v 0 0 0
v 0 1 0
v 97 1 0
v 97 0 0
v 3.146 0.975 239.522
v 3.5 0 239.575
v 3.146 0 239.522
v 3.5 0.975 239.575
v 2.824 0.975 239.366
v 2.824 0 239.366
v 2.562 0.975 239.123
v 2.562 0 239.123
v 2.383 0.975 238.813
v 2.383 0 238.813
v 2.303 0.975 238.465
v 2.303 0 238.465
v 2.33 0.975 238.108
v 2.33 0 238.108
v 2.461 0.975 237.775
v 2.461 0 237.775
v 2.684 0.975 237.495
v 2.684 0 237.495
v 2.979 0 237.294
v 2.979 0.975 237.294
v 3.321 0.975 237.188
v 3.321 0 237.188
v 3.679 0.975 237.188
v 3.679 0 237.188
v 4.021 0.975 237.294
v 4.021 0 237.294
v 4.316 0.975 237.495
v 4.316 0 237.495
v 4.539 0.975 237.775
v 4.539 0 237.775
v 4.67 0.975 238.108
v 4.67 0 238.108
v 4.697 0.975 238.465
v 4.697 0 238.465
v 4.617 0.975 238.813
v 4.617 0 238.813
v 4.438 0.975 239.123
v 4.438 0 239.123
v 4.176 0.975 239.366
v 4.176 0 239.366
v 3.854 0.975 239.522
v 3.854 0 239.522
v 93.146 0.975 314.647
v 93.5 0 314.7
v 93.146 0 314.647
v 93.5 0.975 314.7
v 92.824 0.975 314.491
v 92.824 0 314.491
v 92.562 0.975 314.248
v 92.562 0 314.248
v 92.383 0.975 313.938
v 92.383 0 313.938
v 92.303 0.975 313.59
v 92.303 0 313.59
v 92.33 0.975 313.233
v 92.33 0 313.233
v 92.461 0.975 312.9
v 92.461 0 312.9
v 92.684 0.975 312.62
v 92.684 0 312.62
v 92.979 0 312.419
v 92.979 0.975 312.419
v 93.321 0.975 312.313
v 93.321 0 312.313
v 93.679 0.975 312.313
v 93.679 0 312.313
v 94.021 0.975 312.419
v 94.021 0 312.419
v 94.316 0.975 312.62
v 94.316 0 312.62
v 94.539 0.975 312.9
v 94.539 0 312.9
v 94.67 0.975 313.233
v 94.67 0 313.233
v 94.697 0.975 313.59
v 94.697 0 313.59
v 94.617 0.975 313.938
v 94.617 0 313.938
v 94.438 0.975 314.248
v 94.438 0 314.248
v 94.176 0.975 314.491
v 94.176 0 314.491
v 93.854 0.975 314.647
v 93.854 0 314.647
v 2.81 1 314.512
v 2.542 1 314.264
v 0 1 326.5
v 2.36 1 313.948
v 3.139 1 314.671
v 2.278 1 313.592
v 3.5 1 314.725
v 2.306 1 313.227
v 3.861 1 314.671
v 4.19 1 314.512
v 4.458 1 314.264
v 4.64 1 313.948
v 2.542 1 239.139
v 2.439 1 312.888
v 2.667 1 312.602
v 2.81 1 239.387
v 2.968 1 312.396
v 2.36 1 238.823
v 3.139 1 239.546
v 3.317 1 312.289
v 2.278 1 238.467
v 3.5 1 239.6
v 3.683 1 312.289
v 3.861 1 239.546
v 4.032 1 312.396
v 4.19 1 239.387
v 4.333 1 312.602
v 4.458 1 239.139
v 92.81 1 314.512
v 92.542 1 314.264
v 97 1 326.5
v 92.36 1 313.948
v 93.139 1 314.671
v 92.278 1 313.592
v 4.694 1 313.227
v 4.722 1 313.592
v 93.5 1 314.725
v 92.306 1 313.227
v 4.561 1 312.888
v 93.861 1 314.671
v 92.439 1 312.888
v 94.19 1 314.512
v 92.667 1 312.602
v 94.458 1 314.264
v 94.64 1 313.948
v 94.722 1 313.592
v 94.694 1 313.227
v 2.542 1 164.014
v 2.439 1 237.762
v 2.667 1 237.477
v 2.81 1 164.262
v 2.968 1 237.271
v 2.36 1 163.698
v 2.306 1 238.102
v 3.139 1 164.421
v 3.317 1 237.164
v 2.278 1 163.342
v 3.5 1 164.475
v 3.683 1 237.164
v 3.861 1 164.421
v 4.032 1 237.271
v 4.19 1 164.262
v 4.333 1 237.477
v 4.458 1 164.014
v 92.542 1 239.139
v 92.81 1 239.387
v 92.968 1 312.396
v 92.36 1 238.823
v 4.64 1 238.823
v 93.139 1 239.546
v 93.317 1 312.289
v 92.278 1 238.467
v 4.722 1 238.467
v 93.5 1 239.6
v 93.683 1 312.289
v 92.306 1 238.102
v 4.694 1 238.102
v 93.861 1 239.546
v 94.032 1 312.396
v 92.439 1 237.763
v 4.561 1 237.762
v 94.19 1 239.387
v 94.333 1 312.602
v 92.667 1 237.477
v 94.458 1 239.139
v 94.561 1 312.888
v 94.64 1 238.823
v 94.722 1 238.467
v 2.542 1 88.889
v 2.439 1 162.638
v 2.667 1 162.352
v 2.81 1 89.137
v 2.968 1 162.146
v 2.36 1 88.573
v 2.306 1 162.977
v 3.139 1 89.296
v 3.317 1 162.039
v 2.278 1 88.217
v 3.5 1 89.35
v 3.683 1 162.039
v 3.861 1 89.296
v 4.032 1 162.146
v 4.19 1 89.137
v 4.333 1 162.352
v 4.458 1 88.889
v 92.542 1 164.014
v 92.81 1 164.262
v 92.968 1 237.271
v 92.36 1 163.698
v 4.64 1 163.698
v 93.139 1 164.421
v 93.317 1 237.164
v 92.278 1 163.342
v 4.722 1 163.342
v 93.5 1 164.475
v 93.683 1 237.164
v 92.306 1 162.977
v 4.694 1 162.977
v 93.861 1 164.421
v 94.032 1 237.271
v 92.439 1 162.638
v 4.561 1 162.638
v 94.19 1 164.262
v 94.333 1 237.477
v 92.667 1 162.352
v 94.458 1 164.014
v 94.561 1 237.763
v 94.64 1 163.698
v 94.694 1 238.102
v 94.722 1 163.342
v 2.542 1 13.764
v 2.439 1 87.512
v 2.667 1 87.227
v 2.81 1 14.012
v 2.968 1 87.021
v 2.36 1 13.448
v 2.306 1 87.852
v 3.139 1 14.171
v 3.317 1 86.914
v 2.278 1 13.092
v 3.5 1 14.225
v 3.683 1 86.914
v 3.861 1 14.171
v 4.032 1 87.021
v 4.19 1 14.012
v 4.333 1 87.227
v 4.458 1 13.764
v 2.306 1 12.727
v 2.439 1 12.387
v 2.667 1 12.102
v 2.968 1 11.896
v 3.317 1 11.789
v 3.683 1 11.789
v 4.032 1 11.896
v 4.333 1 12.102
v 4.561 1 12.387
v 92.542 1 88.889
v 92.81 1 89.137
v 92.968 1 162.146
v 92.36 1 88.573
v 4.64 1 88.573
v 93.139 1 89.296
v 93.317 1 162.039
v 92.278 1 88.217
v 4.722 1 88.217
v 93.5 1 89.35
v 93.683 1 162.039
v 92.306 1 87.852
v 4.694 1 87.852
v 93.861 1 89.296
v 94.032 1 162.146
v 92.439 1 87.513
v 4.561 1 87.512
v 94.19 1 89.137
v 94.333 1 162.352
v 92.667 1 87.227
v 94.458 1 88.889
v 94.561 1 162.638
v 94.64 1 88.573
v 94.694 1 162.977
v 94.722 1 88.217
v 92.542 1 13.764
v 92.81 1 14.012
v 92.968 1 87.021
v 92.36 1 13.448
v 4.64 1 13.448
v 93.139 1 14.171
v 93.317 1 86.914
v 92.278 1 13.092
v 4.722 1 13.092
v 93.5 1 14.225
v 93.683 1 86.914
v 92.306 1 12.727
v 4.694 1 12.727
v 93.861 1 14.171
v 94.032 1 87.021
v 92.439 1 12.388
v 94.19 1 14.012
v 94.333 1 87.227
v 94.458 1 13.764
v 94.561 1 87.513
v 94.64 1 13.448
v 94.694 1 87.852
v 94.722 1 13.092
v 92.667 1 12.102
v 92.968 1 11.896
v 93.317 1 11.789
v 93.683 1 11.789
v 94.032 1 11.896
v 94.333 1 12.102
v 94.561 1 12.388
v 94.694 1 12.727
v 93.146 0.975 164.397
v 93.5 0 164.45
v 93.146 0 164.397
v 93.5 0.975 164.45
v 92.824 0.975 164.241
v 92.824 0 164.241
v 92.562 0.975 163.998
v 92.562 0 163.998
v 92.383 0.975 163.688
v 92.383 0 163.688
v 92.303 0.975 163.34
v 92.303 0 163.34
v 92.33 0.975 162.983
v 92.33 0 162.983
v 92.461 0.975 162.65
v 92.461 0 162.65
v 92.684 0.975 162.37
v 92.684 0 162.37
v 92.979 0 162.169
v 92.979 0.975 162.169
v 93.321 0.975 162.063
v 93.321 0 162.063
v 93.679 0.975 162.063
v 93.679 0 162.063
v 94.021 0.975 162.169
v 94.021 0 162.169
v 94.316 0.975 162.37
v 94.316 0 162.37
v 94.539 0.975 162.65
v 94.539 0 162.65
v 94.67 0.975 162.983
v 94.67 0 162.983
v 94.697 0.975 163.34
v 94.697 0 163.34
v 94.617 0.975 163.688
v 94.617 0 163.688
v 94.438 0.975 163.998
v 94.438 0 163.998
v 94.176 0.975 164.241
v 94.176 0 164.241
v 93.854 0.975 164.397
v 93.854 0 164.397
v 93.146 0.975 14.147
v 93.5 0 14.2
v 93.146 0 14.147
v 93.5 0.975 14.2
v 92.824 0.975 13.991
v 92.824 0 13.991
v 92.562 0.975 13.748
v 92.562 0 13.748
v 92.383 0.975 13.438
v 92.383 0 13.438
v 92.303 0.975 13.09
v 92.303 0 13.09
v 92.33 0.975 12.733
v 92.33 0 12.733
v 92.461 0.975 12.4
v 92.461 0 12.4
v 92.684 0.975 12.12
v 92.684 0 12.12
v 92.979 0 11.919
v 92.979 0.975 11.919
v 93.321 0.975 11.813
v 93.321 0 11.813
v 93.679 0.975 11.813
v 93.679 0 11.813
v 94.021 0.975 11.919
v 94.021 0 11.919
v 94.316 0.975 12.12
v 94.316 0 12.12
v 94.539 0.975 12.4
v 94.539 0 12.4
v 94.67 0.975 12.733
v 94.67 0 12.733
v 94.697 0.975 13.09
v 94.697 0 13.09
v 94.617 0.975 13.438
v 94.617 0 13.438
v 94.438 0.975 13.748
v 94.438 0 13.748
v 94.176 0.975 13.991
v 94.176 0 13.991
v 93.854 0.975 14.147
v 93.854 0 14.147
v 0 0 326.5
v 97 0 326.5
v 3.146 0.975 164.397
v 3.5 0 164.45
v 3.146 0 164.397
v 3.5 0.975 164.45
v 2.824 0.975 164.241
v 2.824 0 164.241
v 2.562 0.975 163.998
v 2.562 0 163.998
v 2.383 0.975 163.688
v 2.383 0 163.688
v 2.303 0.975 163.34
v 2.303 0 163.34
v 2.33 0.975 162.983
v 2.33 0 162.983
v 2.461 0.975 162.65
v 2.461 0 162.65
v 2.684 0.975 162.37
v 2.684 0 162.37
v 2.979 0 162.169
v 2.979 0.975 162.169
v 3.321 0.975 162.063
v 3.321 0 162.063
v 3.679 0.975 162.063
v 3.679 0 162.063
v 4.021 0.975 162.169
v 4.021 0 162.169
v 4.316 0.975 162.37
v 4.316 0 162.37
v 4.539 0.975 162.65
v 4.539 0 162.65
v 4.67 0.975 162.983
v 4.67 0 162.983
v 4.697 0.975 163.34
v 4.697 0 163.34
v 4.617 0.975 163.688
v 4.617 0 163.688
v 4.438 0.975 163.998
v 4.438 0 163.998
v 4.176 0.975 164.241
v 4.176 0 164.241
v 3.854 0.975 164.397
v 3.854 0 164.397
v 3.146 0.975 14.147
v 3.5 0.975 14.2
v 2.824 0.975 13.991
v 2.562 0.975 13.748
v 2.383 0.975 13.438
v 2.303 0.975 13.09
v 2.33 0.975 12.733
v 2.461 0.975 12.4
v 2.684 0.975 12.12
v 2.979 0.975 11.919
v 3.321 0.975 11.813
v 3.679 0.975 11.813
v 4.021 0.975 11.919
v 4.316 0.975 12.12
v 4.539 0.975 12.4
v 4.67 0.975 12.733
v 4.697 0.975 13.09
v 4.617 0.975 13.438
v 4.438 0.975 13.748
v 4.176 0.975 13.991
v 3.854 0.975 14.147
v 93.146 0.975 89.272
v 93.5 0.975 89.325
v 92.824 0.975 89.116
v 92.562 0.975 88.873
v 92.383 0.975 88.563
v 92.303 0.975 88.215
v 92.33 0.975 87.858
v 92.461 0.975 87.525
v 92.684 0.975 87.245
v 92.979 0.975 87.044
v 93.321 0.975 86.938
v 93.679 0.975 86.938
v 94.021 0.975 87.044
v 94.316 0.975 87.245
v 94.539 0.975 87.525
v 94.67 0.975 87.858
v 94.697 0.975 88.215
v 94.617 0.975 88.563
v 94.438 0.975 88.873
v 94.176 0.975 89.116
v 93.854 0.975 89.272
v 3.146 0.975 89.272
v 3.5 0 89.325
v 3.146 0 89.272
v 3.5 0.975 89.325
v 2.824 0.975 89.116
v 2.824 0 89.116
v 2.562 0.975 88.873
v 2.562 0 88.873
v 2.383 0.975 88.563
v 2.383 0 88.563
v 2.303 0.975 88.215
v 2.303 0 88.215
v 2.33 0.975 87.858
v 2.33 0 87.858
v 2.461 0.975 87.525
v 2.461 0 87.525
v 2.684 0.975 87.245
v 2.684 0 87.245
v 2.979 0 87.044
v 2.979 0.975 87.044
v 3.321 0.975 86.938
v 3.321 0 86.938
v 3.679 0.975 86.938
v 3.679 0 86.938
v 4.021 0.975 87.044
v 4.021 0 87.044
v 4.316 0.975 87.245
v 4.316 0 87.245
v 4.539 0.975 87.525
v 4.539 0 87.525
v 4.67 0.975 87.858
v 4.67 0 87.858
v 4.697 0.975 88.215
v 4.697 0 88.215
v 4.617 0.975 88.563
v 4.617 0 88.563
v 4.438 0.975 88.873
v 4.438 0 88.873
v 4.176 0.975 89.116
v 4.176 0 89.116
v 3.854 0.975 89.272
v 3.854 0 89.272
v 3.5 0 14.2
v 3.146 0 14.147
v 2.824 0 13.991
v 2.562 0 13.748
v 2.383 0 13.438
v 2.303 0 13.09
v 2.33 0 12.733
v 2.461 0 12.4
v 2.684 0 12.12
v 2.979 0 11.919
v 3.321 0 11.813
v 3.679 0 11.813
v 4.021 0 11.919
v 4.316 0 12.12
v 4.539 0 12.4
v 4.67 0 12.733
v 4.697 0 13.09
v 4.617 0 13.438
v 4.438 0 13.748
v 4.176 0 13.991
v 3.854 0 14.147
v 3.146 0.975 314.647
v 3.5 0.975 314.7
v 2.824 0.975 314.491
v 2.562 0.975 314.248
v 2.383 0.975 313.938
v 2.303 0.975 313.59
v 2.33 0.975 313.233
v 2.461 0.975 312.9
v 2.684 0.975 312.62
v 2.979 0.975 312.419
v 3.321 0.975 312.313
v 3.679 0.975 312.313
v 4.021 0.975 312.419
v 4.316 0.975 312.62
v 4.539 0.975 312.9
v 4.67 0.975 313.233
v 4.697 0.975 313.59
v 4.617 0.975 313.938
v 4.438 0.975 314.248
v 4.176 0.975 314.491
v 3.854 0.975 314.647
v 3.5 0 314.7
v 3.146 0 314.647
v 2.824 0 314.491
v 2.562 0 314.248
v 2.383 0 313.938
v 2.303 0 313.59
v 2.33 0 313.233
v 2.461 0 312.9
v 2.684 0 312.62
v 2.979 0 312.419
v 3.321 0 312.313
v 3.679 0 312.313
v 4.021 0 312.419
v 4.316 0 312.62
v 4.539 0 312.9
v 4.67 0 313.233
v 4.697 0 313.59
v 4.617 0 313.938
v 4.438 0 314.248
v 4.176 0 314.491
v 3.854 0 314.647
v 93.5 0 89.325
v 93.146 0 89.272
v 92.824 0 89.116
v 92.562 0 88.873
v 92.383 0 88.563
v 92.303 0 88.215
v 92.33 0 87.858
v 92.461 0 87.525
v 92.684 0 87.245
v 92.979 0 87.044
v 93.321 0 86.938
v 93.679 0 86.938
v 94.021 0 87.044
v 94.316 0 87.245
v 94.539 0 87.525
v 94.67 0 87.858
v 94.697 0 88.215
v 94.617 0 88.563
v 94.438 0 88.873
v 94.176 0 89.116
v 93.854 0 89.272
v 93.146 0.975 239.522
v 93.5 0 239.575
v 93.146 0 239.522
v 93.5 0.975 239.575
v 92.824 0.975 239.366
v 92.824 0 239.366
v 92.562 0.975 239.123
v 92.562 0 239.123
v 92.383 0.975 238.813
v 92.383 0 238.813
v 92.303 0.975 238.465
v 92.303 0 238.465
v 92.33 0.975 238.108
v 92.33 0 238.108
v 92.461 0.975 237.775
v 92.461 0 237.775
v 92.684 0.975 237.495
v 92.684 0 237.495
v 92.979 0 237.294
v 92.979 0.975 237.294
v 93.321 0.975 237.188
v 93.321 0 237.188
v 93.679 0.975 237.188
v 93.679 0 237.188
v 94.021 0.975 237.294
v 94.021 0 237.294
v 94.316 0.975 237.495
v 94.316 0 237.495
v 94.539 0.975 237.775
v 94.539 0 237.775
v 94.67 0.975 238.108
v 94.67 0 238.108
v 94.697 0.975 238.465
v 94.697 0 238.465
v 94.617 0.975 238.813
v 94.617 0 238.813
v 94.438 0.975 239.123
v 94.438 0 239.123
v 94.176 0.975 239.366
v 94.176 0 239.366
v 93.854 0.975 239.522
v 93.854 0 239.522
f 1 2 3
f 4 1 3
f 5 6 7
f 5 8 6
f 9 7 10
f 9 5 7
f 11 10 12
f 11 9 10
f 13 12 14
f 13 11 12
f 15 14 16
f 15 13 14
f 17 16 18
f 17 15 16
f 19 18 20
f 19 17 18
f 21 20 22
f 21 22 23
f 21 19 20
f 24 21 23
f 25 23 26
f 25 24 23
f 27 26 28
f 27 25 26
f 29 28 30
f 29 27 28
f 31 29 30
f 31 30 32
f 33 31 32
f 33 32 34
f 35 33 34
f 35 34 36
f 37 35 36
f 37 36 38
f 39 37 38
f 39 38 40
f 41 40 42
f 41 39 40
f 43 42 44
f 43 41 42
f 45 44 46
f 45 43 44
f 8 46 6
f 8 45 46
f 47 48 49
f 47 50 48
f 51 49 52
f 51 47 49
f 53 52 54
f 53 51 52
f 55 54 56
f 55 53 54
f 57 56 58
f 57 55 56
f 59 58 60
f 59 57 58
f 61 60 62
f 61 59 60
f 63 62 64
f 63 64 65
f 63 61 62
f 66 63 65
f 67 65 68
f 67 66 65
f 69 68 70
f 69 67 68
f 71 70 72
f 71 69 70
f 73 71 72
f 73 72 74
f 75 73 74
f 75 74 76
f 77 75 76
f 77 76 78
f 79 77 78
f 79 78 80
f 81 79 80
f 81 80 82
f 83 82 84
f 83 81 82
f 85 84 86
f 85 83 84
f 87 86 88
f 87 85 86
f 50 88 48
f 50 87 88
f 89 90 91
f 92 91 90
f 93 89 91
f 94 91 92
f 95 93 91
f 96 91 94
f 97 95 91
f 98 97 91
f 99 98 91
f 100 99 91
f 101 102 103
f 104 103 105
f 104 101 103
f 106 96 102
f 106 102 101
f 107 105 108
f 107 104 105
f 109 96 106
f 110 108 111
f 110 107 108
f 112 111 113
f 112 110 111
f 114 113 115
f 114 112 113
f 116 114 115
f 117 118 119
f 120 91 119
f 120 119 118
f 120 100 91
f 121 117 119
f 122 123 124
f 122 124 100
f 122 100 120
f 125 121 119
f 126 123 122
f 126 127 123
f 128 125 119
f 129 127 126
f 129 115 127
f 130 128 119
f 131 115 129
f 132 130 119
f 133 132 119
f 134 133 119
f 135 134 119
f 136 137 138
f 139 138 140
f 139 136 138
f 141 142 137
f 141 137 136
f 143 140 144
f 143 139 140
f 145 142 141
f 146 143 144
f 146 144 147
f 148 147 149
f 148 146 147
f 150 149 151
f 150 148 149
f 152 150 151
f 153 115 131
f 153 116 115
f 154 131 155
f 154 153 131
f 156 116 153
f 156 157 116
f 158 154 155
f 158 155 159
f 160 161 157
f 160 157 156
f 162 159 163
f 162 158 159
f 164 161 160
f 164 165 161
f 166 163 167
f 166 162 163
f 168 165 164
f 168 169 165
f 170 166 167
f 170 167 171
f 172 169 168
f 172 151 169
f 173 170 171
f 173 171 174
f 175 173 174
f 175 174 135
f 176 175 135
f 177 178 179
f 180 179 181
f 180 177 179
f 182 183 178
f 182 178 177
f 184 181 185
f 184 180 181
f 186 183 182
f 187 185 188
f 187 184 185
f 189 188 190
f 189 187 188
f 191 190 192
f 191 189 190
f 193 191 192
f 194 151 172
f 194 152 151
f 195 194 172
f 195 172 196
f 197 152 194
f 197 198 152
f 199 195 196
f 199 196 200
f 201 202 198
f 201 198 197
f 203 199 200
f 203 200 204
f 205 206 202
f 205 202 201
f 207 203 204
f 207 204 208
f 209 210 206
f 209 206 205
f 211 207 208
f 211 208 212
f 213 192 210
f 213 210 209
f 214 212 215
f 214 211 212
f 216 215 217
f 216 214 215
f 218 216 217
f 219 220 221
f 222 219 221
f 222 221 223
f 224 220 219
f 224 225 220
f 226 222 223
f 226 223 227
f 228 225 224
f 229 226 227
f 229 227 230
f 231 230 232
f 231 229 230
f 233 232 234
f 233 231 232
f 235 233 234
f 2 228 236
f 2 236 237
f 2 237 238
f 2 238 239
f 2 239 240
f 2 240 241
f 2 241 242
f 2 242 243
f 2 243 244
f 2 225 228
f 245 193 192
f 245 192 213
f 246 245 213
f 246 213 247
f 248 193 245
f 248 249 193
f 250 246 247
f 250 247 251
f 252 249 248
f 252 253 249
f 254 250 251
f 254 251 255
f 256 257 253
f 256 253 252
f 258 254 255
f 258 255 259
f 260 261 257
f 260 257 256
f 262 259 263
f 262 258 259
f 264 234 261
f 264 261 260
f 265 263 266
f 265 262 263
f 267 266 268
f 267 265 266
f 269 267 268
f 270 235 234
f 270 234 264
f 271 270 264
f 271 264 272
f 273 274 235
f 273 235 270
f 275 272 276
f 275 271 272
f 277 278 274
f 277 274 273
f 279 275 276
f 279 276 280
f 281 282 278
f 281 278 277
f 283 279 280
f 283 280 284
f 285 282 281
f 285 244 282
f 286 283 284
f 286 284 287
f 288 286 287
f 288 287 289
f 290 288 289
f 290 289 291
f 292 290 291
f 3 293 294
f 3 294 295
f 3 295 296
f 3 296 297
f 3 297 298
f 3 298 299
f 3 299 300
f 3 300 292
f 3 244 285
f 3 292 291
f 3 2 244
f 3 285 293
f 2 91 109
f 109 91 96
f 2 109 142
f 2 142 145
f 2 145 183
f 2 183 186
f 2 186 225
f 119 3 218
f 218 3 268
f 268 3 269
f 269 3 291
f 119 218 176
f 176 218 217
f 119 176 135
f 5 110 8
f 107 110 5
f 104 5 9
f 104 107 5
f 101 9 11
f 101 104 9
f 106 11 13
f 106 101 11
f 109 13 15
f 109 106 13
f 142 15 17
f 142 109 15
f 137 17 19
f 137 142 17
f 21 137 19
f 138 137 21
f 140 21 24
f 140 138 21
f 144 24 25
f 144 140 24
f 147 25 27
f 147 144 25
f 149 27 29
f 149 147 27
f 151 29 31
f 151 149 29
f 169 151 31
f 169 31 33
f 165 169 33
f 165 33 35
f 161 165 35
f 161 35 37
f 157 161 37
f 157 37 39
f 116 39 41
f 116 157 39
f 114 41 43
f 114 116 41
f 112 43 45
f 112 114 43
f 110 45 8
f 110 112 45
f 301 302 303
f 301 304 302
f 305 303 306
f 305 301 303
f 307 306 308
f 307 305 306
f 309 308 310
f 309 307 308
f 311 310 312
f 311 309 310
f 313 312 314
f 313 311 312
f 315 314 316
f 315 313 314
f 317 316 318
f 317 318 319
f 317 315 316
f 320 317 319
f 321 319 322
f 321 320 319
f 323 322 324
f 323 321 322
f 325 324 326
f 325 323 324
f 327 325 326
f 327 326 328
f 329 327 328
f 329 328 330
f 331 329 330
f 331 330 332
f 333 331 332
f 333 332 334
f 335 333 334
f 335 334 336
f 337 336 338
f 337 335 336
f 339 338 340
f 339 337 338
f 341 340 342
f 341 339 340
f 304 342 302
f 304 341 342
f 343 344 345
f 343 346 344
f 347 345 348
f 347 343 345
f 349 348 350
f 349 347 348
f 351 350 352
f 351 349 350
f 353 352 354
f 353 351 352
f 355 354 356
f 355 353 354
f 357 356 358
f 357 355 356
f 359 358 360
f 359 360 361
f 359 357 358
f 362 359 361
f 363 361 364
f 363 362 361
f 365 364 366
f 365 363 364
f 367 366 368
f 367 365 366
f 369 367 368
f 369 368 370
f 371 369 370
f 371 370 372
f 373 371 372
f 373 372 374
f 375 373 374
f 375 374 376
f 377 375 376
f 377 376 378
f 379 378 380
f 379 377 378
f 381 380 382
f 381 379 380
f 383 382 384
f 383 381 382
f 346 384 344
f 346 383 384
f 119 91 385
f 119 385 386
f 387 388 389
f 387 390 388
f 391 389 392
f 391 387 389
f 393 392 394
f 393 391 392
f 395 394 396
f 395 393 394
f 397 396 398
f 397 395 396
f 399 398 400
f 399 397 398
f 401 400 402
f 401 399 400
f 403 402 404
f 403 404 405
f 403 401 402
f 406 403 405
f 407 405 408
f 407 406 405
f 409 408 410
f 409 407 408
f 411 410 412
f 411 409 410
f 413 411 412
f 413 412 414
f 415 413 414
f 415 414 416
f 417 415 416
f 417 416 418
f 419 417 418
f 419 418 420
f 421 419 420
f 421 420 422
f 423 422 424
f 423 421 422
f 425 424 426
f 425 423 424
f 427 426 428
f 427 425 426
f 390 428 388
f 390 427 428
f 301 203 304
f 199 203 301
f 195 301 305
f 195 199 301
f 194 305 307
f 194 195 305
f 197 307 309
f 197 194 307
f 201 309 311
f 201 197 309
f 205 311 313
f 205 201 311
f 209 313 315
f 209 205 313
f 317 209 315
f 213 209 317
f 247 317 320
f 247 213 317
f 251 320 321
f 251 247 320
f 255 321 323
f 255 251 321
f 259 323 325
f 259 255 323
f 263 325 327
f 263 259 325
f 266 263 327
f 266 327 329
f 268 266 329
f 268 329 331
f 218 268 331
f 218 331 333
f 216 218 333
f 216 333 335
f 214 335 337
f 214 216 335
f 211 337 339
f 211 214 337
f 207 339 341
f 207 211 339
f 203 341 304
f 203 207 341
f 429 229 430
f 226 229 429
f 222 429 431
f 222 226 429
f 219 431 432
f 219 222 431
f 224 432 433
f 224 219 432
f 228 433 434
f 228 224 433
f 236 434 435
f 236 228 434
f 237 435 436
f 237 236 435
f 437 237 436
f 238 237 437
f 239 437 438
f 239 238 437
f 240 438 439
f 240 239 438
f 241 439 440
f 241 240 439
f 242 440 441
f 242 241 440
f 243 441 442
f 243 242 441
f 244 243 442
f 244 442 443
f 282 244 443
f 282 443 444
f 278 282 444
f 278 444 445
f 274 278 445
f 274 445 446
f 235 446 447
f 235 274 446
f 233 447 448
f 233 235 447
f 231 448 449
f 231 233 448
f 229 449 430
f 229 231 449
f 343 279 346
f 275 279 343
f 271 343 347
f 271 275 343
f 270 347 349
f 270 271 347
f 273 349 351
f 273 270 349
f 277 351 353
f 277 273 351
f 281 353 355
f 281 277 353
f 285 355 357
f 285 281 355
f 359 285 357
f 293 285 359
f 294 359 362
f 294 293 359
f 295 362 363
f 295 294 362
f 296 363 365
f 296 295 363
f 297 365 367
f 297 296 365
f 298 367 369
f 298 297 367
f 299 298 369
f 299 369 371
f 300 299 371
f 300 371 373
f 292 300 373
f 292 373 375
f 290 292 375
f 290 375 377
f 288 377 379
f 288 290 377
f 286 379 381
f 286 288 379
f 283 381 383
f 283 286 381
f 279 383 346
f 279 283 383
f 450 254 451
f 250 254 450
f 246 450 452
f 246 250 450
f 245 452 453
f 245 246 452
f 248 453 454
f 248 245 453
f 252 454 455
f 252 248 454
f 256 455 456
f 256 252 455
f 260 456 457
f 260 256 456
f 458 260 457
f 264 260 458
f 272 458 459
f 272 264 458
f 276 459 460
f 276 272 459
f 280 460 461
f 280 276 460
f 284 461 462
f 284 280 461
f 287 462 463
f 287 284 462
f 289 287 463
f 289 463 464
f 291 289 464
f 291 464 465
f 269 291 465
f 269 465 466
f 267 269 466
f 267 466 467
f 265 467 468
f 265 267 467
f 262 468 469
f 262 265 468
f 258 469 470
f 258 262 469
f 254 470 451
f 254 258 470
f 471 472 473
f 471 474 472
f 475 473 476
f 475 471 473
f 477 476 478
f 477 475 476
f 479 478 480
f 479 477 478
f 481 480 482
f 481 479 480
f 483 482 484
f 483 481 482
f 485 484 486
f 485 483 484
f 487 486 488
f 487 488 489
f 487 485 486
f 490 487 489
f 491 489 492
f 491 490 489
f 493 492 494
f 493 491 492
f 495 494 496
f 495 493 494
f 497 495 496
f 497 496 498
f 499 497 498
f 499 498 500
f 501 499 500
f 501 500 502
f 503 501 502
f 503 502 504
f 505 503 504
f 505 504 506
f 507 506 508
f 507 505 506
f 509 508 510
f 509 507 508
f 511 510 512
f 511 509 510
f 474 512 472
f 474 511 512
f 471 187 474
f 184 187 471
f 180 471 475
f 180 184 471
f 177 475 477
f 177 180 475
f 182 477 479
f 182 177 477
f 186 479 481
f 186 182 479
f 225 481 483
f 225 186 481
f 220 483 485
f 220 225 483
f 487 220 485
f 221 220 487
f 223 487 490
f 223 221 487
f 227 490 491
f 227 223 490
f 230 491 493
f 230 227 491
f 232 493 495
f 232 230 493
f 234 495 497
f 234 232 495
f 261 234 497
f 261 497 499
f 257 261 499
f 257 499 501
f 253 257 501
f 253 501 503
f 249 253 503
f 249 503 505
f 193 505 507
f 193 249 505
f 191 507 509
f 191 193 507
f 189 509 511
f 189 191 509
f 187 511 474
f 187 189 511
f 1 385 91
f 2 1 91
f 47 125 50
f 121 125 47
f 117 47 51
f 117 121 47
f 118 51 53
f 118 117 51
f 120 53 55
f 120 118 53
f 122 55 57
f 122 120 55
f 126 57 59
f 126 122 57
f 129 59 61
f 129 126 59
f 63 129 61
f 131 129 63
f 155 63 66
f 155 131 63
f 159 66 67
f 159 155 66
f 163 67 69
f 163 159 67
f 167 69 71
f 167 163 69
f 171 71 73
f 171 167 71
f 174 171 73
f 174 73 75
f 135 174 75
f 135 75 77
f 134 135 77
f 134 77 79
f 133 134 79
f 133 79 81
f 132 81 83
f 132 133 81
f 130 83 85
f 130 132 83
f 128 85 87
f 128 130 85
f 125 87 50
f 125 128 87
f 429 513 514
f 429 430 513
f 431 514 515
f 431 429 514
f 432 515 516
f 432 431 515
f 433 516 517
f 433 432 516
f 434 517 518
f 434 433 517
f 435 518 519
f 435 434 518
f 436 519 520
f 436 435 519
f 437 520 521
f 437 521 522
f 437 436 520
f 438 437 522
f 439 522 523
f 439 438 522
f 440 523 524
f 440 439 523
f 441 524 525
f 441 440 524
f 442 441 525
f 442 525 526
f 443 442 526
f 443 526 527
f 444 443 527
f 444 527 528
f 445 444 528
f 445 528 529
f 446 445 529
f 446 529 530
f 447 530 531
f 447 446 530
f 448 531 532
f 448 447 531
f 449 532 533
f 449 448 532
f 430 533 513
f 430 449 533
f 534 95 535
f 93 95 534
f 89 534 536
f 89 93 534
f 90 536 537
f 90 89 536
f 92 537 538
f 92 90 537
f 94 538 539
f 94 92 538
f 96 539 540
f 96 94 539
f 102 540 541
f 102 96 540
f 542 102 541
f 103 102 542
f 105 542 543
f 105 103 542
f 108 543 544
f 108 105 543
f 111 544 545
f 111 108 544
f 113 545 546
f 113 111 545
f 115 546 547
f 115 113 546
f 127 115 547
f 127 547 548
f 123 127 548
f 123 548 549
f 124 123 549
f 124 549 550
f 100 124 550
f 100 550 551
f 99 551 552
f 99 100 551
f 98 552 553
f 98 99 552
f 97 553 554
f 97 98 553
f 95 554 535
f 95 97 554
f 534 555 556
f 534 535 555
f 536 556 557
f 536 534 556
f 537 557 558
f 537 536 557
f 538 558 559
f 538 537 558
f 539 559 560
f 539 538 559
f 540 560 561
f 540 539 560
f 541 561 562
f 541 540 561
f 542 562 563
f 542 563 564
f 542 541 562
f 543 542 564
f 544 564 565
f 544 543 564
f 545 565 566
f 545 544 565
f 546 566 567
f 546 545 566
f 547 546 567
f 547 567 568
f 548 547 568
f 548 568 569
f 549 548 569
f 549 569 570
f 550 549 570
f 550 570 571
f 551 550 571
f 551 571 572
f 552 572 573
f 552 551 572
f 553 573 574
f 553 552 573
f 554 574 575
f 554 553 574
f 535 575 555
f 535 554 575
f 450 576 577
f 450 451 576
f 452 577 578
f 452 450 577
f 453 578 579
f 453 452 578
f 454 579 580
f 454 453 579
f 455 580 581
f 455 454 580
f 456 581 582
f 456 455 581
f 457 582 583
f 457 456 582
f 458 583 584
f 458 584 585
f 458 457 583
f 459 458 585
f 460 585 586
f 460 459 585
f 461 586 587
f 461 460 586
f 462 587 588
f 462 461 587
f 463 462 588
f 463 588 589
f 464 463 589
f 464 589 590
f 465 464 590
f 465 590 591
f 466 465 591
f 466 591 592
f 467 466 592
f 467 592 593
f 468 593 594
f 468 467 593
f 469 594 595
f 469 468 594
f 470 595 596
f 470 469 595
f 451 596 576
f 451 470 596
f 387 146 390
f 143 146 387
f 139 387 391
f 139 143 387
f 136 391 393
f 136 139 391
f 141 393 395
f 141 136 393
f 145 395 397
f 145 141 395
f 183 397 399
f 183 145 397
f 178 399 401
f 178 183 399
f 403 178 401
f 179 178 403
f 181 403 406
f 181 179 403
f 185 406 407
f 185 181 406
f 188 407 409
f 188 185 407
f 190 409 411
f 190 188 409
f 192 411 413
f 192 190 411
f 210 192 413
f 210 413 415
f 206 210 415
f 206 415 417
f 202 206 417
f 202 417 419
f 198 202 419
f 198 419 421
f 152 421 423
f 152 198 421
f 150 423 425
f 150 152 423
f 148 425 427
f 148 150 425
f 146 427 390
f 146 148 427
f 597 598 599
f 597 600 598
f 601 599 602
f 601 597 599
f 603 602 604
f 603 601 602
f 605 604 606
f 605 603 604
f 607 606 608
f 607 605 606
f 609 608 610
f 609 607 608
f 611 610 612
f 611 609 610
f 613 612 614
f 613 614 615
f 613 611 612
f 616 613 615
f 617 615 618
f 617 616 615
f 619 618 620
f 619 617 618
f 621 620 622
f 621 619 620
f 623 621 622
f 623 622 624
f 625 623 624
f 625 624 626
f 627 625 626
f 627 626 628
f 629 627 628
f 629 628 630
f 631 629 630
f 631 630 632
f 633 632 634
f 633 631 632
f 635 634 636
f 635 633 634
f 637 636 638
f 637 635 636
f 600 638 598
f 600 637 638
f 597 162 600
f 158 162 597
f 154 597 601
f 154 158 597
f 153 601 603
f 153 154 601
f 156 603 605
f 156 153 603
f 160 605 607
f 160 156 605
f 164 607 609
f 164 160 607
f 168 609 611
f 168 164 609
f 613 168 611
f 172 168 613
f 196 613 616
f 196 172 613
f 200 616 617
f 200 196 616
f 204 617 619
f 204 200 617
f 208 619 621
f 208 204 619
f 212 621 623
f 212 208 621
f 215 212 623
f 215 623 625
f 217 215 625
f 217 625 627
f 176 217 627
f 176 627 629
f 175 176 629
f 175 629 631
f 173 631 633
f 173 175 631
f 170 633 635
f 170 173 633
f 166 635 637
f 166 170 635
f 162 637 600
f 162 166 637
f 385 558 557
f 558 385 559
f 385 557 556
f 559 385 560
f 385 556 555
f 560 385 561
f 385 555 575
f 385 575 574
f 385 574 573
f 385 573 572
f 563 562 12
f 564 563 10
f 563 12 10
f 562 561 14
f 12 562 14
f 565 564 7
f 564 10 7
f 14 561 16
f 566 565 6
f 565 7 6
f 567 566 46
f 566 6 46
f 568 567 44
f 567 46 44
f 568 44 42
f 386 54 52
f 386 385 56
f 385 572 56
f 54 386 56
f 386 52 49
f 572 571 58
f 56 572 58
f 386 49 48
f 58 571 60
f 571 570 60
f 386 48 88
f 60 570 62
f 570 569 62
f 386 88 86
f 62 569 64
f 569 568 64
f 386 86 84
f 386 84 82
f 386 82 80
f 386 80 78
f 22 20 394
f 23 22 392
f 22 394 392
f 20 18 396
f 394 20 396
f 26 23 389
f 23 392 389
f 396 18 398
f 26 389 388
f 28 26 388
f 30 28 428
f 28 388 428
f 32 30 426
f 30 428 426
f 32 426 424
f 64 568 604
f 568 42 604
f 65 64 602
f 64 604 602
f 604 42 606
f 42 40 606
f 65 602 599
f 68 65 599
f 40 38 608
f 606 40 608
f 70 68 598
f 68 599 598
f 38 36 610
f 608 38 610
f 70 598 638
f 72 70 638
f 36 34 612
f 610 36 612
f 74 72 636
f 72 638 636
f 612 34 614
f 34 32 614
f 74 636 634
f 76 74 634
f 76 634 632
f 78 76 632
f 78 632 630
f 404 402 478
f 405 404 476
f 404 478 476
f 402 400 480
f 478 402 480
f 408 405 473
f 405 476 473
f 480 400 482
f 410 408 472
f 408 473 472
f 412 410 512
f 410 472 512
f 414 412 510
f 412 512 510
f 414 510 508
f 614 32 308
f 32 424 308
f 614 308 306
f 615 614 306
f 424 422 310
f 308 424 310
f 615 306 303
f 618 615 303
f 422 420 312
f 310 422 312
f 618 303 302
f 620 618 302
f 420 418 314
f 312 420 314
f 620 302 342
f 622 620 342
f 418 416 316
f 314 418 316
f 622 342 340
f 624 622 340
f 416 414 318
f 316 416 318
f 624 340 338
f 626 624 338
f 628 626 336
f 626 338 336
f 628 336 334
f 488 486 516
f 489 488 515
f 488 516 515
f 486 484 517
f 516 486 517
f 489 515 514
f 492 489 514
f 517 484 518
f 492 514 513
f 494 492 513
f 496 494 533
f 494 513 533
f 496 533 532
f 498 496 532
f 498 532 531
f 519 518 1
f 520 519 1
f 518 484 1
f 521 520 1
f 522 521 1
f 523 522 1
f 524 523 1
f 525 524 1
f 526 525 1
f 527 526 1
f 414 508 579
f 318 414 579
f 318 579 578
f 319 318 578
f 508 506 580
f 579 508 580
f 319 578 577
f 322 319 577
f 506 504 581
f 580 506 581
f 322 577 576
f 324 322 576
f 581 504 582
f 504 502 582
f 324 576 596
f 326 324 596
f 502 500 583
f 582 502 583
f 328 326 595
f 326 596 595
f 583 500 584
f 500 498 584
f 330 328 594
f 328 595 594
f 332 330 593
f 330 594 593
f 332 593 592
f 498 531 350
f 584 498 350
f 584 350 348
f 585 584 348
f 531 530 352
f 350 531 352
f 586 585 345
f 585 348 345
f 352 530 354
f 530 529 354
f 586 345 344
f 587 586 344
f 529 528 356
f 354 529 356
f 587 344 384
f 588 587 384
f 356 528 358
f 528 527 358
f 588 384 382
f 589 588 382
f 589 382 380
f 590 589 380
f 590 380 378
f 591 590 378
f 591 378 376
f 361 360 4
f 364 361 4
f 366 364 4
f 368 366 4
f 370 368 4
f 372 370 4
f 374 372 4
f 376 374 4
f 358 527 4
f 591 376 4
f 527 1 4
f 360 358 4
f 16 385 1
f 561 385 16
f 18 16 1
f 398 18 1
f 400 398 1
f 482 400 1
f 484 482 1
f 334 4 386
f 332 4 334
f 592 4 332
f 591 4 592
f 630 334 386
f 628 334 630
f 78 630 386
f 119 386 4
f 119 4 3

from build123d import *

# Parameters (mm, degrees)
SKETCH1_W                      = 97
SKETCH1_H                      = 1
BOSS_EXTRUDE1_DEPTH            = 326.5
M2_CLEARANCE_HOLE1_AT_2_COUNT  = 2
M2_CLEARANCE_HOLE1_AT_2_PITCH  = 90
M2_CLEARANCE_HOLE1_AT_3_COUNT  = 2
M2_CLEARANCE_HOLE1_AT_3_PITCH  = 75.125
M2_CLEARANCE_HOLE1_AT_4_COUNT  = 2
M2_CLEARANCE_HOLE1_AT_4_PITCH  = 117.233807517
M2_CLEARANCE_HOLE1_AT_5_COUNT  = 2
M2_CLEARANCE_HOLE1_AT_5_PITCH  = 150.25
M2_CLEARANCE_HOLE1_AT_6_COUNT  = 2
M2_CLEARANCE_HOLE1_AT_6_PITCH  = 175.142977307
M2_CLEARANCE_HOLE1_AT_7_COUNT  = 2
M2_CLEARANCE_HOLE1_AT_7_PITCH  = 225.375
M2_CLEARANCE_HOLE1_AT_8_COUNT  = 2
M2_CLEARANCE_HOLE1_AT_8_PITCH  = 242.680635043
M2_CLEARANCE_HOLE1_AT_9_COUNT  = 2
M2_CLEARANCE_HOLE1_AT_9_PITCH  = 300.5
M2_CLEARANCE_HOLE1_AT_10_COUNT = 2
M2_CLEARANCE_HOLE1_AT_10_PITCH = 313.688141312


with BuildPart() as part:
    # Sketch1 → Boss-Extrude1 (new body)
    with BuildSketch(Plane.XY):
        with Locations((48.5, 0.5)):
            Rectangle(SKETCH1_W, SKETCH1_H)
    extrude(amount=BOSS_EXTRUDE1_DEPTH)

    # Sketch3 → M2 Clearance Hole1 (revolve, cut)
    with BuildSketch(Plane(origin=(3.5, 1, 313.5), x_dir=(0, 0, 1), z_dir=(1, 0, 0))):
        Polygon((0, 0), (0, 1), (1.2, 1), (1.2, 0.025), (1.225, 0), align=None)
    m2_clearance_hole1 = revolve(axis=Axis((3.5, 7.35, 313.5), (0, -1, 0)), mode=Mode.SUBTRACT)

    # M2 Clearance Hole1 at 2: M2 Clearance Hole1 ×2
    with Locations(*[(i * M2_CLEARANCE_HOLE1_AT_2_PITCH, 0, 0) for i in range(1, M2_CLEARANCE_HOLE1_AT_2_COUNT)]):
        add(m2_clearance_hole1, mode=Mode.SUBTRACT)

    # M2 Clearance Hole1 at 3: M2 Clearance Hole1 ×2
    with Locations(*[(0, 0, -i * M2_CLEARANCE_HOLE1_AT_3_PITCH) for i in range(1, M2_CLEARANCE_HOLE1_AT_3_COUNT)]):
        add(m2_clearance_hole1, mode=Mode.SUBTRACT)

    # M2 Clearance Hole1 at 4: M2 Clearance Hole1 ×2
    with Locations(*[Vector(0.7676966389301124, 0, -0.6408134444402744) * (i * M2_CLEARANCE_HOLE1_AT_4_PITCH) for i in range(1, M2_CLEARANCE_HOLE1_AT_4_COUNT)]):
        add(m2_clearance_hole1, mode=Mode.SUBTRACT)

    # M2 Clearance Hole1 at 5: M2 Clearance Hole1 ×2
    with Locations(*[(0, 0, -i * M2_CLEARANCE_HOLE1_AT_5_PITCH) for i in range(1, M2_CLEARANCE_HOLE1_AT_5_COUNT)]):
        add(m2_clearance_hole1, mode=Mode.SUBTRACT)

    # M2 Clearance Hole1 at 6: M2 Clearance Hole1 ×2
    with Locations(*[Vector(0.5138658790879463, 0, -0.8578705370329326) * (i * M2_CLEARANCE_HOLE1_AT_6_PITCH) for i in range(1, M2_CLEARANCE_HOLE1_AT_6_COUNT)]):
        add(m2_clearance_hole1, mode=Mode.SUBTRACT)

    # M2 Clearance Hole1 at 7: M2 Clearance Hole1 ×2
    with Locations(*[(0, 0, -i * M2_CLEARANCE_HOLE1_AT_7_PITCH) for i in range(1, M2_CLEARANCE_HOLE1_AT_7_COUNT)]):
        add(m2_clearance_hole1, mode=Mode.SUBTRACT)

    # M2 Clearance Hole1 at 8: M2 Clearance Hole1 ×2
    with Locations(*[Vector(0.3708577735671273, 0, -0.9286896746410146) * (i * M2_CLEARANCE_HOLE1_AT_8_PITCH) for i in range(1, M2_CLEARANCE_HOLE1_AT_8_COUNT)]):
        add(m2_clearance_hole1, mode=Mode.SUBTRACT)

    # M2 Clearance Hole1 at 9: M2 Clearance Hole1 ×2
    with Locations(*[(0, 0, -i * M2_CLEARANCE_HOLE1_AT_9_PITCH) for i in range(1, M2_CLEARANCE_HOLE1_AT_9_COUNT)]):
        add(m2_clearance_hole1, mode=Mode.SUBTRACT)

    # M2 Clearance Hole1 at 10: M2 Clearance Hole1 ×2
    with Locations(*[Vector(0.2869091564108013, 0, -0.9579577944605088) * (i * M2_CLEARANCE_HOLE1_AT_10_PITCH) for i in range(1, M2_CLEARANCE_HOLE1_AT_10_COUNT)]):
        add(m2_clearance_hole1, mode=Mode.SUBTRACT)


solid = part.part
